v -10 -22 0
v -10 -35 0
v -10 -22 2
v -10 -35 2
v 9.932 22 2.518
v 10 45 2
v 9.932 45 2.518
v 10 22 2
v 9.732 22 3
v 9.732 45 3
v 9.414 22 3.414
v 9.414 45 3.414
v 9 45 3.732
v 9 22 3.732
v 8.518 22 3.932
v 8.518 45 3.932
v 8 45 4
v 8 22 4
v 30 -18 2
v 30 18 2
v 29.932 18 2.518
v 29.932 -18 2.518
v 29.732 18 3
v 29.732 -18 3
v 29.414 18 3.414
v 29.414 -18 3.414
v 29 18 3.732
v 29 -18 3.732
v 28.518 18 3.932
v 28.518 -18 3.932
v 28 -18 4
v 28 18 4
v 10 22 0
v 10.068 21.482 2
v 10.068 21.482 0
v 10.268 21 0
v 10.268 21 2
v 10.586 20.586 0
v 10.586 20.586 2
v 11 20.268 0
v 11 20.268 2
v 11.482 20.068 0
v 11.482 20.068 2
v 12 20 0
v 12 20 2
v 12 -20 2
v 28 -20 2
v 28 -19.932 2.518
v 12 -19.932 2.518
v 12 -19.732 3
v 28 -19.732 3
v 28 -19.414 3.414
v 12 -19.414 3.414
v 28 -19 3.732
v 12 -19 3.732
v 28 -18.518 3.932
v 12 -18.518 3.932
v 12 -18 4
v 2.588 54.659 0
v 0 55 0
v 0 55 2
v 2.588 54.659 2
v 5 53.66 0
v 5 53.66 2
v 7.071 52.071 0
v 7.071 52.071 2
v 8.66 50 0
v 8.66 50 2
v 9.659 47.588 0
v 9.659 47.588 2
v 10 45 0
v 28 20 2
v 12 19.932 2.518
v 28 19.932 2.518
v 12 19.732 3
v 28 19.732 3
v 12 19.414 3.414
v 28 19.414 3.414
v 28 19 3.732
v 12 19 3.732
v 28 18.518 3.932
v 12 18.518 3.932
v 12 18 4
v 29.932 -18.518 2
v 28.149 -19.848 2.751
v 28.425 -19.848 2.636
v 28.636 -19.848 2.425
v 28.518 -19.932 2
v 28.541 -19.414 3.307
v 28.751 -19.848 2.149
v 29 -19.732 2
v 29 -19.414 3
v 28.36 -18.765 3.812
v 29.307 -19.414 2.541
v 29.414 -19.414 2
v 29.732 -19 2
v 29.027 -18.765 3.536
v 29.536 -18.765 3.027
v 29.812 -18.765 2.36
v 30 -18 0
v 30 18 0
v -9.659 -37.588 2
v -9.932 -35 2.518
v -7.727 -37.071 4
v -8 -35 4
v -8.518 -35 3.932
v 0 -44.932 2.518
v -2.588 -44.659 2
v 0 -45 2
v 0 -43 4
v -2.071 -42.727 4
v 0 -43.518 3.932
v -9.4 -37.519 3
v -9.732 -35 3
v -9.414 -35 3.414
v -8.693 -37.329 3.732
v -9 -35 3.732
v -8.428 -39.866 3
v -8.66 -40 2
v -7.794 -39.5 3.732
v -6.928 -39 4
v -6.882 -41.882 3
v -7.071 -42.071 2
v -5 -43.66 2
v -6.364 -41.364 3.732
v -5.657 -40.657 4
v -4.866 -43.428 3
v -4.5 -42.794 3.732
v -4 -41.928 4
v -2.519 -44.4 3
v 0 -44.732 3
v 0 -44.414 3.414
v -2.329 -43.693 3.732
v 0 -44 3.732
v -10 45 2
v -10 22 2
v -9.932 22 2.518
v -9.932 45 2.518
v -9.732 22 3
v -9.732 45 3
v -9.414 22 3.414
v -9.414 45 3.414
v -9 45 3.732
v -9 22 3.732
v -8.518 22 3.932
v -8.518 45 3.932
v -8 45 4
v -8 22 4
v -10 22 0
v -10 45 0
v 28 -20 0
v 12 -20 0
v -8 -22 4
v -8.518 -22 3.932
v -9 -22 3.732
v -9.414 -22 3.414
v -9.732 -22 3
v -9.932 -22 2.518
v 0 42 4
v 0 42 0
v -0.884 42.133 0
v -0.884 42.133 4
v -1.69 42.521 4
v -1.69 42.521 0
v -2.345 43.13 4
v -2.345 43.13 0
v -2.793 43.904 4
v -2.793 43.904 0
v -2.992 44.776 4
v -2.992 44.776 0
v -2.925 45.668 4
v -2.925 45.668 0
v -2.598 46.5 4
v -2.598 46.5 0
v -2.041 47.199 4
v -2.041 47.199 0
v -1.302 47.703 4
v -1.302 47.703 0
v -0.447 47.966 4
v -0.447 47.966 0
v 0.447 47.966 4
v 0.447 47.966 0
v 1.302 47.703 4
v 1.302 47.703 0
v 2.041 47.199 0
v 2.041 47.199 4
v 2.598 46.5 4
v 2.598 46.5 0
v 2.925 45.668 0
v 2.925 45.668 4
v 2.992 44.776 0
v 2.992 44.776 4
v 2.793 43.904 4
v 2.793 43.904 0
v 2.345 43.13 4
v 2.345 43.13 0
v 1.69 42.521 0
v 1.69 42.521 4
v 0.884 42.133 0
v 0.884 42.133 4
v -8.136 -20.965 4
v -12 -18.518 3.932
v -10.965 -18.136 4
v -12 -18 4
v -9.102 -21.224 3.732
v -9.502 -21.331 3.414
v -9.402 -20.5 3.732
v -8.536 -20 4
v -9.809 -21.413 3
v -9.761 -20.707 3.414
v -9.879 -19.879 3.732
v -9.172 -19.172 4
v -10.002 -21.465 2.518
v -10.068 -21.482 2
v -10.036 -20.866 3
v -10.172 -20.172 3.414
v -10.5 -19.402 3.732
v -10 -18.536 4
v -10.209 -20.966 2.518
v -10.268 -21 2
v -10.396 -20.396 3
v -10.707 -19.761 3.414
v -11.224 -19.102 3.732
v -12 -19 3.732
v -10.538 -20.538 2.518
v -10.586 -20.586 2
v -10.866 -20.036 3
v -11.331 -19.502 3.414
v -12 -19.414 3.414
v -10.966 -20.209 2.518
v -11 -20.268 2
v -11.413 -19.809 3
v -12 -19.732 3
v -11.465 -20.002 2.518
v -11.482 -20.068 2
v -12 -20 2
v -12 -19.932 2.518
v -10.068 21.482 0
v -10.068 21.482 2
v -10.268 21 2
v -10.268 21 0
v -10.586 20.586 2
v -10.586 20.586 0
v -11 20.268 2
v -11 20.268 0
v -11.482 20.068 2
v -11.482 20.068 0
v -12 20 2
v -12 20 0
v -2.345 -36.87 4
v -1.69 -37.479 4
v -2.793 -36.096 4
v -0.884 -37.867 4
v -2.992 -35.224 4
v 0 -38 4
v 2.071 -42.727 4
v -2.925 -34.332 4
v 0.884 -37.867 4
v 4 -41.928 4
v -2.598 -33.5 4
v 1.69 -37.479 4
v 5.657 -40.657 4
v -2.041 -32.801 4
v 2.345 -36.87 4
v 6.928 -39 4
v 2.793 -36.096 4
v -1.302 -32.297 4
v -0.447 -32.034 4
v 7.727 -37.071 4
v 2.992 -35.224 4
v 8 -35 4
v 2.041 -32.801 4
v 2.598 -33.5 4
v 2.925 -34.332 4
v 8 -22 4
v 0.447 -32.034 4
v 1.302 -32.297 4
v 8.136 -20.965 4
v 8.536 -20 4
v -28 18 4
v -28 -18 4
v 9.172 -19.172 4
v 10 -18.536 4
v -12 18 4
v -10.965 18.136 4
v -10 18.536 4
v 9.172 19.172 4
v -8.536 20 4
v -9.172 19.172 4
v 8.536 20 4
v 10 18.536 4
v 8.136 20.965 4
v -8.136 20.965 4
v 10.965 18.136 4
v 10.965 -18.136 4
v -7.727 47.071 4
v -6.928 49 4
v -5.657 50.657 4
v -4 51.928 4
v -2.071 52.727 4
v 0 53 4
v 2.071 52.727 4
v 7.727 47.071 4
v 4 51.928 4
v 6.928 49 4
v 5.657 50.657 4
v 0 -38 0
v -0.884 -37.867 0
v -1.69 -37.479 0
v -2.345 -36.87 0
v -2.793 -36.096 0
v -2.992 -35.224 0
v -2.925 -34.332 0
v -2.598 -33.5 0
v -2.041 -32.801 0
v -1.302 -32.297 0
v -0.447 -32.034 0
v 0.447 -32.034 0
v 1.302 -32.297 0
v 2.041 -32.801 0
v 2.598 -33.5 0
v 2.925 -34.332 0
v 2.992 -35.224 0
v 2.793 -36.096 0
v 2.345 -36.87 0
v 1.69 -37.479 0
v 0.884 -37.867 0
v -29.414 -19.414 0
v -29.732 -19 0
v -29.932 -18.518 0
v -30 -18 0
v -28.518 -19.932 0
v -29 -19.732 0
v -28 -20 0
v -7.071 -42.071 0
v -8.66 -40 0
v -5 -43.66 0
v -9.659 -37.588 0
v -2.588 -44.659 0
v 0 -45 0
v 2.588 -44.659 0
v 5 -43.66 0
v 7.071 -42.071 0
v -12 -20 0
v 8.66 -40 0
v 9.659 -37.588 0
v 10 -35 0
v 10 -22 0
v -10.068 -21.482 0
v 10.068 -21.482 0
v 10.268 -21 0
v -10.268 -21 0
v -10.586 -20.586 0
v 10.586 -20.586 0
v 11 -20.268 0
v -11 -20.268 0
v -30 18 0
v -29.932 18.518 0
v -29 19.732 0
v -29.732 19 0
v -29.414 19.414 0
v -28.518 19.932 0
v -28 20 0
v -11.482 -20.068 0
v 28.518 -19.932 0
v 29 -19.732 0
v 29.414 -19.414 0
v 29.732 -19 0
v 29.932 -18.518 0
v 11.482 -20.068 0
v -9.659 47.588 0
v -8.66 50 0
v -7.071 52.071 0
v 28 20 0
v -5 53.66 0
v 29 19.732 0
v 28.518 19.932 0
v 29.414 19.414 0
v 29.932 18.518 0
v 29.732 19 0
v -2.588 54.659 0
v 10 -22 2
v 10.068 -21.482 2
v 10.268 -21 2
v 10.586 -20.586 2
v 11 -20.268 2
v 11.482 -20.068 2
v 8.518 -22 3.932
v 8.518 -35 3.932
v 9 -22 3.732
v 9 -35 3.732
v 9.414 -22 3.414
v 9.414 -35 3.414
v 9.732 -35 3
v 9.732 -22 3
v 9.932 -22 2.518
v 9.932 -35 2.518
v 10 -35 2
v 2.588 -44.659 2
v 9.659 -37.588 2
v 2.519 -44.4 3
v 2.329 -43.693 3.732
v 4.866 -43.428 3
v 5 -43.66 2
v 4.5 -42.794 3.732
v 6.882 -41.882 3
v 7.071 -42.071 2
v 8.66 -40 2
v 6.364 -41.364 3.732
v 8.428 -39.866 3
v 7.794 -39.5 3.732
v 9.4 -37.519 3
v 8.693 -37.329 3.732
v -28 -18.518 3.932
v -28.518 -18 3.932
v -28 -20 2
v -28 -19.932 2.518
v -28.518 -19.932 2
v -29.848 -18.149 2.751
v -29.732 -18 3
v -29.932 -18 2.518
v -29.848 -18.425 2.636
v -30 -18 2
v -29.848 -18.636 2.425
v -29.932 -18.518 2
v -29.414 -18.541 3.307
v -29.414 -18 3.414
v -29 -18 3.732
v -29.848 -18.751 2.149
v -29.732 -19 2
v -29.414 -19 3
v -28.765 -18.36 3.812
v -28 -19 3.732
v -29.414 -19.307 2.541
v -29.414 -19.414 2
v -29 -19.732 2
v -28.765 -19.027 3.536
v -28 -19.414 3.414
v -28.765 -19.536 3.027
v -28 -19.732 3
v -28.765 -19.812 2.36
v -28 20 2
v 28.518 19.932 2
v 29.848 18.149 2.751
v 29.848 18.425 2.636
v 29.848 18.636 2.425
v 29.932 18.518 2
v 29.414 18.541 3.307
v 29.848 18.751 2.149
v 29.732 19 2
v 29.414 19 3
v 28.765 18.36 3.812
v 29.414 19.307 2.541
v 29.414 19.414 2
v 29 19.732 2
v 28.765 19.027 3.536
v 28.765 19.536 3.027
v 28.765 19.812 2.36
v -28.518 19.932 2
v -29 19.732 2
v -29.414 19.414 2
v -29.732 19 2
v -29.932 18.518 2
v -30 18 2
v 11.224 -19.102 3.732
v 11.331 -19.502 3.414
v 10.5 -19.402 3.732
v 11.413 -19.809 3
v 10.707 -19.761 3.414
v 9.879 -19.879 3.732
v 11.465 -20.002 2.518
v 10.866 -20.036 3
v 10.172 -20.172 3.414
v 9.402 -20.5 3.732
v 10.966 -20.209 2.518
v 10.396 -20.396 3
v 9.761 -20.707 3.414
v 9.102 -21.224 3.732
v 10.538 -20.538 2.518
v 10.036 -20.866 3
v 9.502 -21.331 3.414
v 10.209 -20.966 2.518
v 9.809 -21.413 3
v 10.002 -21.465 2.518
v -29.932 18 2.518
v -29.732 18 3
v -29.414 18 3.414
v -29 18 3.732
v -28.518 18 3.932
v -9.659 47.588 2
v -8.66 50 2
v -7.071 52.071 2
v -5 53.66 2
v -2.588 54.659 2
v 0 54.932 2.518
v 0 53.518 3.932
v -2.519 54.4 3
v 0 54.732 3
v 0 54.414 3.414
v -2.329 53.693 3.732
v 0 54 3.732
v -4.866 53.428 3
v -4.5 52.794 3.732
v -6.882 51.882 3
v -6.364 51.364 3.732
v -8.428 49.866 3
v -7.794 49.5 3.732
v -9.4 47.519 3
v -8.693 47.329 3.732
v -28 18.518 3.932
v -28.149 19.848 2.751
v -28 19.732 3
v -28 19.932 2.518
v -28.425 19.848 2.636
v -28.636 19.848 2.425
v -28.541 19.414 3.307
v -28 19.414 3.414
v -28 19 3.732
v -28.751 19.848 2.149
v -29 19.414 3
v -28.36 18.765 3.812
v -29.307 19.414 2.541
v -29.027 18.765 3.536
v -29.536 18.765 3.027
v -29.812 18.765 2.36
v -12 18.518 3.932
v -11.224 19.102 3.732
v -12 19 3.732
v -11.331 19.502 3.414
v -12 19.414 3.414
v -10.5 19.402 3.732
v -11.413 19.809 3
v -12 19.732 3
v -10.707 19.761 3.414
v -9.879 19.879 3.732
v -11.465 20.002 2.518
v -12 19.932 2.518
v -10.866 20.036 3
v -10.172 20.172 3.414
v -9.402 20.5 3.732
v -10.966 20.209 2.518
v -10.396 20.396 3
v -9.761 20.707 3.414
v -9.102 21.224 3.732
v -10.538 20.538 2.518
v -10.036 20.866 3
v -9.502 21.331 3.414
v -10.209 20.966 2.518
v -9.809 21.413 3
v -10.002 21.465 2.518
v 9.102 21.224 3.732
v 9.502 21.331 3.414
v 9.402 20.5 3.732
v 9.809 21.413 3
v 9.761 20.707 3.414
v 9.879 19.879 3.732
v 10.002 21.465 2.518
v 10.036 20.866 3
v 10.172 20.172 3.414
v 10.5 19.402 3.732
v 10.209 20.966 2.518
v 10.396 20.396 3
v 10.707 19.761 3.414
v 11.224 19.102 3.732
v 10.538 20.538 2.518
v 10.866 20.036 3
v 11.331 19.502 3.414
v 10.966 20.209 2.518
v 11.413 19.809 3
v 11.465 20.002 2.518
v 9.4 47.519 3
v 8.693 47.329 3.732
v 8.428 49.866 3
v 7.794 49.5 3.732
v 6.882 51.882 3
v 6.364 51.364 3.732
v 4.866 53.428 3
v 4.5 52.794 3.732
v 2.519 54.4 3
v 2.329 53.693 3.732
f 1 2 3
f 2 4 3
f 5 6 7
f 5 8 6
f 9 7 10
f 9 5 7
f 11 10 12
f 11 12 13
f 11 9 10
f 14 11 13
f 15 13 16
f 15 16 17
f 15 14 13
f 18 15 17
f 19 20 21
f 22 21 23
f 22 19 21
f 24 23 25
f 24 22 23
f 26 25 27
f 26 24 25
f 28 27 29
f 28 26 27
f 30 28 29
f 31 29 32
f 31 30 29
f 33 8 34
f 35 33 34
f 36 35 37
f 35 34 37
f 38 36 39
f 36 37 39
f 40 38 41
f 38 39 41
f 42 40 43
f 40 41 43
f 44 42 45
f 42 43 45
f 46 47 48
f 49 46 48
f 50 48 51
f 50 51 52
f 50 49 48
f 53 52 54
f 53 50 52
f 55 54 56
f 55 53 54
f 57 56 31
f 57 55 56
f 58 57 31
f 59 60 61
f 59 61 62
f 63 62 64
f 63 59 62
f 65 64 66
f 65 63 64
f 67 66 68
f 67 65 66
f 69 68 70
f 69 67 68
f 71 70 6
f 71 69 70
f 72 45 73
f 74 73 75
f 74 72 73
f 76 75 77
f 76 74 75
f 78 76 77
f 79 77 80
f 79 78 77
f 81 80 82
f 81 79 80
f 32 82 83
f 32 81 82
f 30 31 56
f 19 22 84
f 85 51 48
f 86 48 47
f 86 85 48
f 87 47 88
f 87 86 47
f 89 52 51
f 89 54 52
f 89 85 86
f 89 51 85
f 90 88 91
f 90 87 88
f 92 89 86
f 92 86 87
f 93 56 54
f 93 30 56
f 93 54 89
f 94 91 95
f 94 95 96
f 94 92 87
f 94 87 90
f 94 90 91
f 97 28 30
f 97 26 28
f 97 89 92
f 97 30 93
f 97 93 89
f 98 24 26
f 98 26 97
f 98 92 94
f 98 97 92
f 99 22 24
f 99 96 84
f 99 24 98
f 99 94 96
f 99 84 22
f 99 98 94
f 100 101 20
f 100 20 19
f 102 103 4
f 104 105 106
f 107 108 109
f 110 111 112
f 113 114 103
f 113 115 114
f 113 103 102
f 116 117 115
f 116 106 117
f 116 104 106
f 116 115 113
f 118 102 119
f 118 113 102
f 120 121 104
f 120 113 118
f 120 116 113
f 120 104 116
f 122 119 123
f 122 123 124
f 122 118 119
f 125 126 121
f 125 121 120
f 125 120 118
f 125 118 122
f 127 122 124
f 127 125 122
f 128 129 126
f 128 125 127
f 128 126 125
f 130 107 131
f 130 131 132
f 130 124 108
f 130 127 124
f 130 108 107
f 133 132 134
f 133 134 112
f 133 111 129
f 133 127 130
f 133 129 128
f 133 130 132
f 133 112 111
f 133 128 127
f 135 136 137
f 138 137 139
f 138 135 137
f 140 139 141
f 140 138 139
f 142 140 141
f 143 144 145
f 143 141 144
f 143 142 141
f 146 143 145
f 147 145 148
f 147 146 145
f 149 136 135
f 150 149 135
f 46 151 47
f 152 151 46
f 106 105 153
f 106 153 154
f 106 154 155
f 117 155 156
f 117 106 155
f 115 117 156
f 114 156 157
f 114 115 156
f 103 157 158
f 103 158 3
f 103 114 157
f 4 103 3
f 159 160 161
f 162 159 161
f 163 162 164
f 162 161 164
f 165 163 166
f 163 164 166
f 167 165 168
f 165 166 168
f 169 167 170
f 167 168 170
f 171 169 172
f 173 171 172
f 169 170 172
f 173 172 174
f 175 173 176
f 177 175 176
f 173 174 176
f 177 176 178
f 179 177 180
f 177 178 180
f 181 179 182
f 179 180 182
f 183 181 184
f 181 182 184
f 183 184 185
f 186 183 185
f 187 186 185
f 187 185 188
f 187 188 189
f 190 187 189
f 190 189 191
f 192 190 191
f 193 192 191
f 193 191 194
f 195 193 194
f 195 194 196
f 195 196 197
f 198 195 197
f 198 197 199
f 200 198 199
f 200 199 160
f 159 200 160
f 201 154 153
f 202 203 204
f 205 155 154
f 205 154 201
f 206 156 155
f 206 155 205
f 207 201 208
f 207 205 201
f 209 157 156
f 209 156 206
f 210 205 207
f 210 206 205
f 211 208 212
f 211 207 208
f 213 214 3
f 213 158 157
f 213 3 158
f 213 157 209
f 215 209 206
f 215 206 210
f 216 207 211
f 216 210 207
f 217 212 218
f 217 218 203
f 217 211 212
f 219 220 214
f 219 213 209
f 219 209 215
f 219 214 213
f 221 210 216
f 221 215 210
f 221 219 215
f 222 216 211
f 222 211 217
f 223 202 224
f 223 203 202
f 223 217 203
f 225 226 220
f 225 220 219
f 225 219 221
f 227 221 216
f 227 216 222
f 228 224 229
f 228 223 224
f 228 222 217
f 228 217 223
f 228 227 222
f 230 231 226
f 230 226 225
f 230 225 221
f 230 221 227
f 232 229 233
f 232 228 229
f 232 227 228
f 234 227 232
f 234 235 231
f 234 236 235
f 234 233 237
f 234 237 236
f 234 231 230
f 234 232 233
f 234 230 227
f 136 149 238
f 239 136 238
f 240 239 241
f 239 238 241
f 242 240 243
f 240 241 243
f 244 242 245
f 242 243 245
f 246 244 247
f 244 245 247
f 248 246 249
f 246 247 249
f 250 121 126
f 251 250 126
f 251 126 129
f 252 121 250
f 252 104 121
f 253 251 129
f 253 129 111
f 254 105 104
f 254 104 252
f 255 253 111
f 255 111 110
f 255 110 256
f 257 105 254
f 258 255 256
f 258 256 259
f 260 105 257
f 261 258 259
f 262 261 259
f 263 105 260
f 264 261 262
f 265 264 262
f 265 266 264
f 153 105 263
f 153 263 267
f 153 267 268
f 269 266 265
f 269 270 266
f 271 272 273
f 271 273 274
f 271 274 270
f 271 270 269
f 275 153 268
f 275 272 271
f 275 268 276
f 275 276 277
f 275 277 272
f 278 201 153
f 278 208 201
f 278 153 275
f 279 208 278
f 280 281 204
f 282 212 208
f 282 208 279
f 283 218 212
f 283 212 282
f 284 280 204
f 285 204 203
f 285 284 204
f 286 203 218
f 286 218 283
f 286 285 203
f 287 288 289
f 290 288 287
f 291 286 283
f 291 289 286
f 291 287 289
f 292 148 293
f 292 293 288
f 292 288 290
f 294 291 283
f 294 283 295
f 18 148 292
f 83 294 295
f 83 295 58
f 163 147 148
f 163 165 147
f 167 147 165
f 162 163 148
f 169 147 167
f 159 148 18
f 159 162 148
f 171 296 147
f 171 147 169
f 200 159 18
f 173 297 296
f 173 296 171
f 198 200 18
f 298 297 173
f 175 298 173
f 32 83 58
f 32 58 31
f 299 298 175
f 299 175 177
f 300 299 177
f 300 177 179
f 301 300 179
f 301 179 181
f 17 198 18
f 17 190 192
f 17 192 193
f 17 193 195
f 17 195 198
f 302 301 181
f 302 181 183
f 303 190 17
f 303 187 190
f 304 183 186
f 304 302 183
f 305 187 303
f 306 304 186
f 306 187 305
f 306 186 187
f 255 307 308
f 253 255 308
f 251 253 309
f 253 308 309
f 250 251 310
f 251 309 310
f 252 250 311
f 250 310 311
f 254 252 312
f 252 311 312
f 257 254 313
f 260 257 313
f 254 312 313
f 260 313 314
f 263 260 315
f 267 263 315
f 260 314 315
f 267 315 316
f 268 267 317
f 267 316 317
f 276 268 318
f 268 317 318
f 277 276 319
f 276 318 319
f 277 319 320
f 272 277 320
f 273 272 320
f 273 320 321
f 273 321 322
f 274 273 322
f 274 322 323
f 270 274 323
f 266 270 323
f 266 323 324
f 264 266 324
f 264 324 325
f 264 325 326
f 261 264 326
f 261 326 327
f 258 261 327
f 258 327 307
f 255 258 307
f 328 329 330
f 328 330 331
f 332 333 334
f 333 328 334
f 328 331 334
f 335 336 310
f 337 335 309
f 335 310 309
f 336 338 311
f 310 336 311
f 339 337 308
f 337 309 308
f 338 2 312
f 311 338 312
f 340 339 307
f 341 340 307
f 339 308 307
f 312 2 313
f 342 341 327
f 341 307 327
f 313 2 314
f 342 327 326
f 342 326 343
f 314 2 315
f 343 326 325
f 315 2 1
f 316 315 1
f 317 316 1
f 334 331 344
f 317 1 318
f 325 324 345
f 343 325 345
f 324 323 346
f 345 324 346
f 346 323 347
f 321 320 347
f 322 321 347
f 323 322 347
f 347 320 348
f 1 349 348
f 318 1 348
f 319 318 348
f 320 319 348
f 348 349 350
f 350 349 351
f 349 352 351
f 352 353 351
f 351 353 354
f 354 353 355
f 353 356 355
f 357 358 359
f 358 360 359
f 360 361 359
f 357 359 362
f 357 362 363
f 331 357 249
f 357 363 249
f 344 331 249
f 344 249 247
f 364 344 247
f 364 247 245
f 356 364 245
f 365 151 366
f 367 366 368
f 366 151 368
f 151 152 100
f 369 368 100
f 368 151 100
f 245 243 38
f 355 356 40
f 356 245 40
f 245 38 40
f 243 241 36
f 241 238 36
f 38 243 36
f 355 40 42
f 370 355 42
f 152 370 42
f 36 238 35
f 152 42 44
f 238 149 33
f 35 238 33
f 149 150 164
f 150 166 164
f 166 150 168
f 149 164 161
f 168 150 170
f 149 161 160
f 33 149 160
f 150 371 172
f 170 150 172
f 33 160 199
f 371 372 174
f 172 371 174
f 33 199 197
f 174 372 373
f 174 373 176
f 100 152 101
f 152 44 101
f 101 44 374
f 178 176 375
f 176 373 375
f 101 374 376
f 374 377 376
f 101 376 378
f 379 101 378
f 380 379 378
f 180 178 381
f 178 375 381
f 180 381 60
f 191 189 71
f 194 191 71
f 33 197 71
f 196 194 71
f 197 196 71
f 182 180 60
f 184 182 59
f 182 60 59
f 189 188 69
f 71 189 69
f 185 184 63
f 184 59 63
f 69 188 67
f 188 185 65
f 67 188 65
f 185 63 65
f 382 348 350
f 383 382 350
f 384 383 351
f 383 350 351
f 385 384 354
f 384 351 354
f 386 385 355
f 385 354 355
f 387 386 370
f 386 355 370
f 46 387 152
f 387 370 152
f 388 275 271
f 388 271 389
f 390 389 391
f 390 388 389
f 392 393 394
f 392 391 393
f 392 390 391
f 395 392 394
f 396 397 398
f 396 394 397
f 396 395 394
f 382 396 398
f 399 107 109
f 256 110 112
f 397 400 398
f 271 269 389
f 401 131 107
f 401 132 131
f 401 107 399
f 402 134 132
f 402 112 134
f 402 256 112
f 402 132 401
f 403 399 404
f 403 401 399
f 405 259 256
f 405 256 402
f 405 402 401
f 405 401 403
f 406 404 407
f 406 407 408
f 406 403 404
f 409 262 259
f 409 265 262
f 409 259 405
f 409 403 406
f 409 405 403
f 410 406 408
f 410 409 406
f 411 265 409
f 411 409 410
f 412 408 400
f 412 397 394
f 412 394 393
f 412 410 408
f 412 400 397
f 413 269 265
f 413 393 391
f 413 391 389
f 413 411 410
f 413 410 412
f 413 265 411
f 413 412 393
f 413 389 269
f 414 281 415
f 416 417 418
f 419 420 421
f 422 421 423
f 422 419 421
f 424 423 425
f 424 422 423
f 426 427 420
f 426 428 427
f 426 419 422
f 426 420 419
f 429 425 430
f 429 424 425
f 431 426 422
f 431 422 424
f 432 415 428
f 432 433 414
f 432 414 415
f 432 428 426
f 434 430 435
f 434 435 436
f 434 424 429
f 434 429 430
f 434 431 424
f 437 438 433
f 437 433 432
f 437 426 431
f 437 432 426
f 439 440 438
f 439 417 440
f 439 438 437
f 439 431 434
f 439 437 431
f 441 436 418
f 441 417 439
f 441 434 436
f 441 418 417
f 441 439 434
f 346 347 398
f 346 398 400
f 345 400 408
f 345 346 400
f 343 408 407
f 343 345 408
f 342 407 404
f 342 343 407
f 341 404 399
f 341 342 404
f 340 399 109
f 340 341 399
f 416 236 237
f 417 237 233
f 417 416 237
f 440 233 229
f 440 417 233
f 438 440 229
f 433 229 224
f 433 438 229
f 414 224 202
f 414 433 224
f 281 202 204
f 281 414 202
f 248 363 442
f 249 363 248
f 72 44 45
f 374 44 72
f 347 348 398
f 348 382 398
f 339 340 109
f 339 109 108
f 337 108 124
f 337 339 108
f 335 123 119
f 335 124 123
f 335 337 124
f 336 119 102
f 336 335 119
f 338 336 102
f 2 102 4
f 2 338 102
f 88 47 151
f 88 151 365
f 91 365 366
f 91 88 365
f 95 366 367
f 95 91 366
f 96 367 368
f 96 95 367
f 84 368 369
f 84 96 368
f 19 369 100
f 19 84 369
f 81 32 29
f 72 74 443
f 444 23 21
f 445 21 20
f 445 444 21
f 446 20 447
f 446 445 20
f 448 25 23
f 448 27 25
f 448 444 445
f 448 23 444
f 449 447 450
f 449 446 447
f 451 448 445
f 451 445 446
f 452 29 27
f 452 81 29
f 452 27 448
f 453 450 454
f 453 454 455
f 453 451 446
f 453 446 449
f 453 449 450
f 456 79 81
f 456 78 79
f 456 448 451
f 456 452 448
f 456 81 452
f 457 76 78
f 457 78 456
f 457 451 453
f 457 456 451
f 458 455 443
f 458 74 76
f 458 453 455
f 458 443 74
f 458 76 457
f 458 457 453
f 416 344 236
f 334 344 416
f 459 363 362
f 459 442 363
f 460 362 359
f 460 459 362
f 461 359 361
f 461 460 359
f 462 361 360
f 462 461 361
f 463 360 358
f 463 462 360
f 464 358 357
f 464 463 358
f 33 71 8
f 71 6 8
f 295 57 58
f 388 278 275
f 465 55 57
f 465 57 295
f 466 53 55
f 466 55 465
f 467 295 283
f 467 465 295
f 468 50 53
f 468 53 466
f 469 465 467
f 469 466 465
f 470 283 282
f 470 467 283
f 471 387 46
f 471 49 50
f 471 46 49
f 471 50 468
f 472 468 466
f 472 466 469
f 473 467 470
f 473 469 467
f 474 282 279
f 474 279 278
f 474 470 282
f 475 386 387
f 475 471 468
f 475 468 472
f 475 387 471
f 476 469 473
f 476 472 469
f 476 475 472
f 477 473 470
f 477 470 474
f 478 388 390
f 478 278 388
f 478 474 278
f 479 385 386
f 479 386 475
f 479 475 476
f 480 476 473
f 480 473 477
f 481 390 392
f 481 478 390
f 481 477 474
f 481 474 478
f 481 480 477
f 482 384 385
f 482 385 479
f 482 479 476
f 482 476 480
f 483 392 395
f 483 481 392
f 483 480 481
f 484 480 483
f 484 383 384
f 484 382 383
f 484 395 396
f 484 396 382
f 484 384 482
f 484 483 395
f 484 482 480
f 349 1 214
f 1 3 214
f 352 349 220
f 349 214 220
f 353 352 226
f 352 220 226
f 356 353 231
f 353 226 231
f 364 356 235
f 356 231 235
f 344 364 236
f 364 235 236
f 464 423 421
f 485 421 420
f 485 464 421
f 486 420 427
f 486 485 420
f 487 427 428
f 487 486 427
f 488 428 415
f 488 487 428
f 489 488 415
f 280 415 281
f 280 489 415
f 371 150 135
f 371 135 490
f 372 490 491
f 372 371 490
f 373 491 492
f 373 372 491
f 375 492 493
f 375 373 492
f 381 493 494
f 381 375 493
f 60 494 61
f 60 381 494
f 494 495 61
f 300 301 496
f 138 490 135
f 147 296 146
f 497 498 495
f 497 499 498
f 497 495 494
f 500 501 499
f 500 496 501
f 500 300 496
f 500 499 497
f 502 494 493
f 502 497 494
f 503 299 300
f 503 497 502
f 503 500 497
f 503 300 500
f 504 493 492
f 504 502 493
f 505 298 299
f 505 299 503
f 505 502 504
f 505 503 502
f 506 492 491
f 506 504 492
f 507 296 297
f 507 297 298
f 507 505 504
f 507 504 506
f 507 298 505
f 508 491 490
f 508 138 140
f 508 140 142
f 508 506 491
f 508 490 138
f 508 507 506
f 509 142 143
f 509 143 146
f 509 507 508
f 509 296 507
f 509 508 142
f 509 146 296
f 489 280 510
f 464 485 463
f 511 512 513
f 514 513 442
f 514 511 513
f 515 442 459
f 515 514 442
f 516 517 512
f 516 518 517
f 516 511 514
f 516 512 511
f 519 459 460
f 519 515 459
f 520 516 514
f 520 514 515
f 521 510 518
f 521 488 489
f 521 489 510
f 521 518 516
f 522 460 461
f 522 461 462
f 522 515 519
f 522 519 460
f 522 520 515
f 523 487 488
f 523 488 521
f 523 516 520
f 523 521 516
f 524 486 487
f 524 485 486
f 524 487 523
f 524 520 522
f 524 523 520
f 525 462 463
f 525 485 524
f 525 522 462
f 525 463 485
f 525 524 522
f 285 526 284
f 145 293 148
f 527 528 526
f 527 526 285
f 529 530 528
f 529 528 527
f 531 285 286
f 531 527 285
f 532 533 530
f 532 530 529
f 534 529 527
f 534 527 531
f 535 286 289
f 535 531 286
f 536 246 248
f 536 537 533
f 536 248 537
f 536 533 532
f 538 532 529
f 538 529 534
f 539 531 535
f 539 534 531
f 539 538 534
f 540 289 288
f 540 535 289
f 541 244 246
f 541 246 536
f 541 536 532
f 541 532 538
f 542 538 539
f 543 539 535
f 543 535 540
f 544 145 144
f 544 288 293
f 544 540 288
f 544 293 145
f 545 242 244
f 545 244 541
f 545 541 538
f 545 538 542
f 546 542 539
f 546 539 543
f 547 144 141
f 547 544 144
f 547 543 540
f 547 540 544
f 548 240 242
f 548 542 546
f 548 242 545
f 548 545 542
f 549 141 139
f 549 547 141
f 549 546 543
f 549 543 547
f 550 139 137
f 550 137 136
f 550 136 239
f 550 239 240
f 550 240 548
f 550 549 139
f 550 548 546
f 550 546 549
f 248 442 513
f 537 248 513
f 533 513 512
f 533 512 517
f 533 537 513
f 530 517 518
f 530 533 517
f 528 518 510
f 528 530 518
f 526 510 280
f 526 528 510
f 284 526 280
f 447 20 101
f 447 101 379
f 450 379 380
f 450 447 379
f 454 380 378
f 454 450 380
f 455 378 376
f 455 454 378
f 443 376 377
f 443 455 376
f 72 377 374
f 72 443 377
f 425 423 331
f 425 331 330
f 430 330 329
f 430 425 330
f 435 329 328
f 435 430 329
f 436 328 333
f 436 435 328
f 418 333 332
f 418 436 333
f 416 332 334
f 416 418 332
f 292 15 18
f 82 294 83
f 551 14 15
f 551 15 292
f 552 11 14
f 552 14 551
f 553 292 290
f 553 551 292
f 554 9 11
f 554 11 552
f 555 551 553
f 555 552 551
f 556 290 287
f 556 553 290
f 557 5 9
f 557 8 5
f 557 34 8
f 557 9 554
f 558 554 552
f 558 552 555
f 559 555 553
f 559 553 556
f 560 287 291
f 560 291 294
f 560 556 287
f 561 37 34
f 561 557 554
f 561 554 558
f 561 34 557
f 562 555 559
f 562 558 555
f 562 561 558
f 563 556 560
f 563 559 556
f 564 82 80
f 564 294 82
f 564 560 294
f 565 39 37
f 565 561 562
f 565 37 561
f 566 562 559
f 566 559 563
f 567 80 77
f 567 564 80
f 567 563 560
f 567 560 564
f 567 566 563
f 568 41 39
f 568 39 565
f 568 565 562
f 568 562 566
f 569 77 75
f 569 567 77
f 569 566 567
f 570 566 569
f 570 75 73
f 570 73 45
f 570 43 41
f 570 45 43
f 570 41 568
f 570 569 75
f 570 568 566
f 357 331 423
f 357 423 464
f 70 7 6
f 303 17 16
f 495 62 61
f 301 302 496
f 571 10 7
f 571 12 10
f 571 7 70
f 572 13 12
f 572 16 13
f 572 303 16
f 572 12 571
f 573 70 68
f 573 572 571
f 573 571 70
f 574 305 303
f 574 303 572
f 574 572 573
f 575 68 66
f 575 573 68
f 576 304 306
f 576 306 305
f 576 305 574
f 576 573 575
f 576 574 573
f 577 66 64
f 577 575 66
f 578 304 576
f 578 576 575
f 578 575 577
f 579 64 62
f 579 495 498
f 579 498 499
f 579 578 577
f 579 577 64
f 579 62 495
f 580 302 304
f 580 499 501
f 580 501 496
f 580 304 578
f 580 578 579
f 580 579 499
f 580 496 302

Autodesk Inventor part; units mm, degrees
ref_plane "YZ Plane" through (0, 0, 0) normal (1, 0, 0) x (0, 1, 0)
ref_plane "XZ Plane" through (0, 0, 0) normal (0, 1, 0) x (-1, 0, 0)
ref_plane "XY Plane" through (0, 0, 0) normal (0, 0, 1) x (1, 0, 0)
sketch "スケッチ1" plane through (0, 0, 0) normal (0, 0, 1) x (1, 0, 0)
  line L0 (-30, 20) -> (30, 20)
  line L1 (30, 20) -> (30, -20)
  line L2 (30, -20) -> (-30, -20)
  line L3 (-30, -20) -> (-30, 20)
  line L4 (-30, 20) -> (30, -20) construction
  line L5 (30, 20) -> (-30, -20) construction
  point P0 (0, 0)
  dimension "d0" = 60
  dimension "d1" = 40
extrude "押し出し1" add sketch "スケッチ1" along normal blind 4
sketch "スケッチ2" plane through (0, 0, 4) normal (0, 0, 1) x (1, 0, 0)
  line L0 (-10, 55) -> (10, 55)
  line L1 (10, 55) -> (10, -45)
  line L2 (10, -45) -> (-10, -45)
  line L3 (-10, -45) -> (-10, 55)
  point P0 (0, 0)
  dimension "d4" = 20
  dimension "d5" = 100
  dimension "d6" = 10
  dimension "d7" = 55
extrude "押し出し2" add sketch "スケッチ2" against normal blind 4
fillet "フィレット1" radius 10 4 edges at (10, 55, 2) (-10, 55, 2) (10, -45, 2) (-10, -45, 2)
fillet "フィレット2" radius 2 22 edges at (10, 32.5001, 4) (-10, 32.5001, 4) (-7.0711, 52.0711, 4) (7.0711, 52.0711, 4) (20, 20, 4) (30, 0, 4) (20, -20, 4) (-7.0711, -42.0711, 4) (7.0711, -42.0711, 4) (-10, -27.5001, 4) (10, -27.5, 4) (-20, -20, 4) (-30, 0, 4) (-20, 20, 4) (-30, 20, 2) (-10, 20, 2) (-30, -20, 2) (-10, -20, 2) (10, -20, 2) (30, -20, 2) (30, 20, 2) (10, 20, 2)
sketch "スケッチ3" plane through (0, 0, 4) normal (0, 0, 1) x (1, 0, 0)
  arc A0 (10, 45) -> (-10, 45) centre (0, 45) ccw projected
  arc A1 (-10, -35) -> (10, -35) centre (0, -35) ccw projected
  point P0 (0, 0)
  dimension "d12" = 0
  dimension "d13" = 0
hole "穴1" at (0, -35, 4) at (0, 45, 4) direction (0, 0, -1) diameter 6 end through all
properties part number "joy_mount_T"
